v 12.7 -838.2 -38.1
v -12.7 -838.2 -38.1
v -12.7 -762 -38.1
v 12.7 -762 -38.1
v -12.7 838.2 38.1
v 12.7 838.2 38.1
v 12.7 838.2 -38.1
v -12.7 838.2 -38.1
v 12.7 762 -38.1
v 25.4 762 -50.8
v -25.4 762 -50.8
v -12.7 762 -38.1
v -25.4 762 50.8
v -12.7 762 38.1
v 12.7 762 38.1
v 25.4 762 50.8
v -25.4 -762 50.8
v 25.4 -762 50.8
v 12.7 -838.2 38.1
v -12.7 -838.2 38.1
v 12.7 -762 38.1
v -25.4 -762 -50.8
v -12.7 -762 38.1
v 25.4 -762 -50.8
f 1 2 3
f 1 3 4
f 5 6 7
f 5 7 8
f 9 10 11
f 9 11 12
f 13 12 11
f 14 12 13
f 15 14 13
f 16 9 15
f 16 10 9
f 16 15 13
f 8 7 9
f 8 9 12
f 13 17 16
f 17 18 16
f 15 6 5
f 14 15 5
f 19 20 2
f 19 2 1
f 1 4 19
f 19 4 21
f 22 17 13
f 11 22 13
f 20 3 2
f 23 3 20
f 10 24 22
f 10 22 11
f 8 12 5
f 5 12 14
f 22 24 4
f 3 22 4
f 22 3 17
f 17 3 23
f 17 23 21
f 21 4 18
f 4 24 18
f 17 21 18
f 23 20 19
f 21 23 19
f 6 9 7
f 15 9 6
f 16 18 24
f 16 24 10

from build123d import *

# Parameters (mm, degrees)
F0_W          = 1524
F0_H          = 101.6
F1_DEPTH      = 25.4
F1_DEPTH_BACK = 25.4
F2_W          = 25.4
F2_H          = 76.2
F3_DEPTH      = 76.2
F4_W          = 25.4
F4_H          = 76.2
F5_DEPTH      = 76.2


with BuildPart() as f1:
    # F0 (on Right) → F1 (new body, two sides)
    with BuildSketch(Plane.YZ) as f1_sk:
        Rectangle(F0_W, F0_H)
    extrude(amount=F1_DEPTH)
    extrude(f1_sk.sketch, amount=-F1_DEPTH_BACK)

    # F2 (on face) → F3 (join)
    with BuildSketch(Plane(origin=(0, 762, 0), x_dir=(-1, 0, 0), z_dir=(0, 1, 0))):
        Rectangle(F2_W, F2_H)
    extrude(amount=F3_DEPTH)

    # F4 (on face) → F5 (join)
    with BuildSketch(Plane.XZ.offset(762)):
        Rectangle(F4_W, F4_H)
    extrude(amount=F5_DEPTH)


solid = f1.part
